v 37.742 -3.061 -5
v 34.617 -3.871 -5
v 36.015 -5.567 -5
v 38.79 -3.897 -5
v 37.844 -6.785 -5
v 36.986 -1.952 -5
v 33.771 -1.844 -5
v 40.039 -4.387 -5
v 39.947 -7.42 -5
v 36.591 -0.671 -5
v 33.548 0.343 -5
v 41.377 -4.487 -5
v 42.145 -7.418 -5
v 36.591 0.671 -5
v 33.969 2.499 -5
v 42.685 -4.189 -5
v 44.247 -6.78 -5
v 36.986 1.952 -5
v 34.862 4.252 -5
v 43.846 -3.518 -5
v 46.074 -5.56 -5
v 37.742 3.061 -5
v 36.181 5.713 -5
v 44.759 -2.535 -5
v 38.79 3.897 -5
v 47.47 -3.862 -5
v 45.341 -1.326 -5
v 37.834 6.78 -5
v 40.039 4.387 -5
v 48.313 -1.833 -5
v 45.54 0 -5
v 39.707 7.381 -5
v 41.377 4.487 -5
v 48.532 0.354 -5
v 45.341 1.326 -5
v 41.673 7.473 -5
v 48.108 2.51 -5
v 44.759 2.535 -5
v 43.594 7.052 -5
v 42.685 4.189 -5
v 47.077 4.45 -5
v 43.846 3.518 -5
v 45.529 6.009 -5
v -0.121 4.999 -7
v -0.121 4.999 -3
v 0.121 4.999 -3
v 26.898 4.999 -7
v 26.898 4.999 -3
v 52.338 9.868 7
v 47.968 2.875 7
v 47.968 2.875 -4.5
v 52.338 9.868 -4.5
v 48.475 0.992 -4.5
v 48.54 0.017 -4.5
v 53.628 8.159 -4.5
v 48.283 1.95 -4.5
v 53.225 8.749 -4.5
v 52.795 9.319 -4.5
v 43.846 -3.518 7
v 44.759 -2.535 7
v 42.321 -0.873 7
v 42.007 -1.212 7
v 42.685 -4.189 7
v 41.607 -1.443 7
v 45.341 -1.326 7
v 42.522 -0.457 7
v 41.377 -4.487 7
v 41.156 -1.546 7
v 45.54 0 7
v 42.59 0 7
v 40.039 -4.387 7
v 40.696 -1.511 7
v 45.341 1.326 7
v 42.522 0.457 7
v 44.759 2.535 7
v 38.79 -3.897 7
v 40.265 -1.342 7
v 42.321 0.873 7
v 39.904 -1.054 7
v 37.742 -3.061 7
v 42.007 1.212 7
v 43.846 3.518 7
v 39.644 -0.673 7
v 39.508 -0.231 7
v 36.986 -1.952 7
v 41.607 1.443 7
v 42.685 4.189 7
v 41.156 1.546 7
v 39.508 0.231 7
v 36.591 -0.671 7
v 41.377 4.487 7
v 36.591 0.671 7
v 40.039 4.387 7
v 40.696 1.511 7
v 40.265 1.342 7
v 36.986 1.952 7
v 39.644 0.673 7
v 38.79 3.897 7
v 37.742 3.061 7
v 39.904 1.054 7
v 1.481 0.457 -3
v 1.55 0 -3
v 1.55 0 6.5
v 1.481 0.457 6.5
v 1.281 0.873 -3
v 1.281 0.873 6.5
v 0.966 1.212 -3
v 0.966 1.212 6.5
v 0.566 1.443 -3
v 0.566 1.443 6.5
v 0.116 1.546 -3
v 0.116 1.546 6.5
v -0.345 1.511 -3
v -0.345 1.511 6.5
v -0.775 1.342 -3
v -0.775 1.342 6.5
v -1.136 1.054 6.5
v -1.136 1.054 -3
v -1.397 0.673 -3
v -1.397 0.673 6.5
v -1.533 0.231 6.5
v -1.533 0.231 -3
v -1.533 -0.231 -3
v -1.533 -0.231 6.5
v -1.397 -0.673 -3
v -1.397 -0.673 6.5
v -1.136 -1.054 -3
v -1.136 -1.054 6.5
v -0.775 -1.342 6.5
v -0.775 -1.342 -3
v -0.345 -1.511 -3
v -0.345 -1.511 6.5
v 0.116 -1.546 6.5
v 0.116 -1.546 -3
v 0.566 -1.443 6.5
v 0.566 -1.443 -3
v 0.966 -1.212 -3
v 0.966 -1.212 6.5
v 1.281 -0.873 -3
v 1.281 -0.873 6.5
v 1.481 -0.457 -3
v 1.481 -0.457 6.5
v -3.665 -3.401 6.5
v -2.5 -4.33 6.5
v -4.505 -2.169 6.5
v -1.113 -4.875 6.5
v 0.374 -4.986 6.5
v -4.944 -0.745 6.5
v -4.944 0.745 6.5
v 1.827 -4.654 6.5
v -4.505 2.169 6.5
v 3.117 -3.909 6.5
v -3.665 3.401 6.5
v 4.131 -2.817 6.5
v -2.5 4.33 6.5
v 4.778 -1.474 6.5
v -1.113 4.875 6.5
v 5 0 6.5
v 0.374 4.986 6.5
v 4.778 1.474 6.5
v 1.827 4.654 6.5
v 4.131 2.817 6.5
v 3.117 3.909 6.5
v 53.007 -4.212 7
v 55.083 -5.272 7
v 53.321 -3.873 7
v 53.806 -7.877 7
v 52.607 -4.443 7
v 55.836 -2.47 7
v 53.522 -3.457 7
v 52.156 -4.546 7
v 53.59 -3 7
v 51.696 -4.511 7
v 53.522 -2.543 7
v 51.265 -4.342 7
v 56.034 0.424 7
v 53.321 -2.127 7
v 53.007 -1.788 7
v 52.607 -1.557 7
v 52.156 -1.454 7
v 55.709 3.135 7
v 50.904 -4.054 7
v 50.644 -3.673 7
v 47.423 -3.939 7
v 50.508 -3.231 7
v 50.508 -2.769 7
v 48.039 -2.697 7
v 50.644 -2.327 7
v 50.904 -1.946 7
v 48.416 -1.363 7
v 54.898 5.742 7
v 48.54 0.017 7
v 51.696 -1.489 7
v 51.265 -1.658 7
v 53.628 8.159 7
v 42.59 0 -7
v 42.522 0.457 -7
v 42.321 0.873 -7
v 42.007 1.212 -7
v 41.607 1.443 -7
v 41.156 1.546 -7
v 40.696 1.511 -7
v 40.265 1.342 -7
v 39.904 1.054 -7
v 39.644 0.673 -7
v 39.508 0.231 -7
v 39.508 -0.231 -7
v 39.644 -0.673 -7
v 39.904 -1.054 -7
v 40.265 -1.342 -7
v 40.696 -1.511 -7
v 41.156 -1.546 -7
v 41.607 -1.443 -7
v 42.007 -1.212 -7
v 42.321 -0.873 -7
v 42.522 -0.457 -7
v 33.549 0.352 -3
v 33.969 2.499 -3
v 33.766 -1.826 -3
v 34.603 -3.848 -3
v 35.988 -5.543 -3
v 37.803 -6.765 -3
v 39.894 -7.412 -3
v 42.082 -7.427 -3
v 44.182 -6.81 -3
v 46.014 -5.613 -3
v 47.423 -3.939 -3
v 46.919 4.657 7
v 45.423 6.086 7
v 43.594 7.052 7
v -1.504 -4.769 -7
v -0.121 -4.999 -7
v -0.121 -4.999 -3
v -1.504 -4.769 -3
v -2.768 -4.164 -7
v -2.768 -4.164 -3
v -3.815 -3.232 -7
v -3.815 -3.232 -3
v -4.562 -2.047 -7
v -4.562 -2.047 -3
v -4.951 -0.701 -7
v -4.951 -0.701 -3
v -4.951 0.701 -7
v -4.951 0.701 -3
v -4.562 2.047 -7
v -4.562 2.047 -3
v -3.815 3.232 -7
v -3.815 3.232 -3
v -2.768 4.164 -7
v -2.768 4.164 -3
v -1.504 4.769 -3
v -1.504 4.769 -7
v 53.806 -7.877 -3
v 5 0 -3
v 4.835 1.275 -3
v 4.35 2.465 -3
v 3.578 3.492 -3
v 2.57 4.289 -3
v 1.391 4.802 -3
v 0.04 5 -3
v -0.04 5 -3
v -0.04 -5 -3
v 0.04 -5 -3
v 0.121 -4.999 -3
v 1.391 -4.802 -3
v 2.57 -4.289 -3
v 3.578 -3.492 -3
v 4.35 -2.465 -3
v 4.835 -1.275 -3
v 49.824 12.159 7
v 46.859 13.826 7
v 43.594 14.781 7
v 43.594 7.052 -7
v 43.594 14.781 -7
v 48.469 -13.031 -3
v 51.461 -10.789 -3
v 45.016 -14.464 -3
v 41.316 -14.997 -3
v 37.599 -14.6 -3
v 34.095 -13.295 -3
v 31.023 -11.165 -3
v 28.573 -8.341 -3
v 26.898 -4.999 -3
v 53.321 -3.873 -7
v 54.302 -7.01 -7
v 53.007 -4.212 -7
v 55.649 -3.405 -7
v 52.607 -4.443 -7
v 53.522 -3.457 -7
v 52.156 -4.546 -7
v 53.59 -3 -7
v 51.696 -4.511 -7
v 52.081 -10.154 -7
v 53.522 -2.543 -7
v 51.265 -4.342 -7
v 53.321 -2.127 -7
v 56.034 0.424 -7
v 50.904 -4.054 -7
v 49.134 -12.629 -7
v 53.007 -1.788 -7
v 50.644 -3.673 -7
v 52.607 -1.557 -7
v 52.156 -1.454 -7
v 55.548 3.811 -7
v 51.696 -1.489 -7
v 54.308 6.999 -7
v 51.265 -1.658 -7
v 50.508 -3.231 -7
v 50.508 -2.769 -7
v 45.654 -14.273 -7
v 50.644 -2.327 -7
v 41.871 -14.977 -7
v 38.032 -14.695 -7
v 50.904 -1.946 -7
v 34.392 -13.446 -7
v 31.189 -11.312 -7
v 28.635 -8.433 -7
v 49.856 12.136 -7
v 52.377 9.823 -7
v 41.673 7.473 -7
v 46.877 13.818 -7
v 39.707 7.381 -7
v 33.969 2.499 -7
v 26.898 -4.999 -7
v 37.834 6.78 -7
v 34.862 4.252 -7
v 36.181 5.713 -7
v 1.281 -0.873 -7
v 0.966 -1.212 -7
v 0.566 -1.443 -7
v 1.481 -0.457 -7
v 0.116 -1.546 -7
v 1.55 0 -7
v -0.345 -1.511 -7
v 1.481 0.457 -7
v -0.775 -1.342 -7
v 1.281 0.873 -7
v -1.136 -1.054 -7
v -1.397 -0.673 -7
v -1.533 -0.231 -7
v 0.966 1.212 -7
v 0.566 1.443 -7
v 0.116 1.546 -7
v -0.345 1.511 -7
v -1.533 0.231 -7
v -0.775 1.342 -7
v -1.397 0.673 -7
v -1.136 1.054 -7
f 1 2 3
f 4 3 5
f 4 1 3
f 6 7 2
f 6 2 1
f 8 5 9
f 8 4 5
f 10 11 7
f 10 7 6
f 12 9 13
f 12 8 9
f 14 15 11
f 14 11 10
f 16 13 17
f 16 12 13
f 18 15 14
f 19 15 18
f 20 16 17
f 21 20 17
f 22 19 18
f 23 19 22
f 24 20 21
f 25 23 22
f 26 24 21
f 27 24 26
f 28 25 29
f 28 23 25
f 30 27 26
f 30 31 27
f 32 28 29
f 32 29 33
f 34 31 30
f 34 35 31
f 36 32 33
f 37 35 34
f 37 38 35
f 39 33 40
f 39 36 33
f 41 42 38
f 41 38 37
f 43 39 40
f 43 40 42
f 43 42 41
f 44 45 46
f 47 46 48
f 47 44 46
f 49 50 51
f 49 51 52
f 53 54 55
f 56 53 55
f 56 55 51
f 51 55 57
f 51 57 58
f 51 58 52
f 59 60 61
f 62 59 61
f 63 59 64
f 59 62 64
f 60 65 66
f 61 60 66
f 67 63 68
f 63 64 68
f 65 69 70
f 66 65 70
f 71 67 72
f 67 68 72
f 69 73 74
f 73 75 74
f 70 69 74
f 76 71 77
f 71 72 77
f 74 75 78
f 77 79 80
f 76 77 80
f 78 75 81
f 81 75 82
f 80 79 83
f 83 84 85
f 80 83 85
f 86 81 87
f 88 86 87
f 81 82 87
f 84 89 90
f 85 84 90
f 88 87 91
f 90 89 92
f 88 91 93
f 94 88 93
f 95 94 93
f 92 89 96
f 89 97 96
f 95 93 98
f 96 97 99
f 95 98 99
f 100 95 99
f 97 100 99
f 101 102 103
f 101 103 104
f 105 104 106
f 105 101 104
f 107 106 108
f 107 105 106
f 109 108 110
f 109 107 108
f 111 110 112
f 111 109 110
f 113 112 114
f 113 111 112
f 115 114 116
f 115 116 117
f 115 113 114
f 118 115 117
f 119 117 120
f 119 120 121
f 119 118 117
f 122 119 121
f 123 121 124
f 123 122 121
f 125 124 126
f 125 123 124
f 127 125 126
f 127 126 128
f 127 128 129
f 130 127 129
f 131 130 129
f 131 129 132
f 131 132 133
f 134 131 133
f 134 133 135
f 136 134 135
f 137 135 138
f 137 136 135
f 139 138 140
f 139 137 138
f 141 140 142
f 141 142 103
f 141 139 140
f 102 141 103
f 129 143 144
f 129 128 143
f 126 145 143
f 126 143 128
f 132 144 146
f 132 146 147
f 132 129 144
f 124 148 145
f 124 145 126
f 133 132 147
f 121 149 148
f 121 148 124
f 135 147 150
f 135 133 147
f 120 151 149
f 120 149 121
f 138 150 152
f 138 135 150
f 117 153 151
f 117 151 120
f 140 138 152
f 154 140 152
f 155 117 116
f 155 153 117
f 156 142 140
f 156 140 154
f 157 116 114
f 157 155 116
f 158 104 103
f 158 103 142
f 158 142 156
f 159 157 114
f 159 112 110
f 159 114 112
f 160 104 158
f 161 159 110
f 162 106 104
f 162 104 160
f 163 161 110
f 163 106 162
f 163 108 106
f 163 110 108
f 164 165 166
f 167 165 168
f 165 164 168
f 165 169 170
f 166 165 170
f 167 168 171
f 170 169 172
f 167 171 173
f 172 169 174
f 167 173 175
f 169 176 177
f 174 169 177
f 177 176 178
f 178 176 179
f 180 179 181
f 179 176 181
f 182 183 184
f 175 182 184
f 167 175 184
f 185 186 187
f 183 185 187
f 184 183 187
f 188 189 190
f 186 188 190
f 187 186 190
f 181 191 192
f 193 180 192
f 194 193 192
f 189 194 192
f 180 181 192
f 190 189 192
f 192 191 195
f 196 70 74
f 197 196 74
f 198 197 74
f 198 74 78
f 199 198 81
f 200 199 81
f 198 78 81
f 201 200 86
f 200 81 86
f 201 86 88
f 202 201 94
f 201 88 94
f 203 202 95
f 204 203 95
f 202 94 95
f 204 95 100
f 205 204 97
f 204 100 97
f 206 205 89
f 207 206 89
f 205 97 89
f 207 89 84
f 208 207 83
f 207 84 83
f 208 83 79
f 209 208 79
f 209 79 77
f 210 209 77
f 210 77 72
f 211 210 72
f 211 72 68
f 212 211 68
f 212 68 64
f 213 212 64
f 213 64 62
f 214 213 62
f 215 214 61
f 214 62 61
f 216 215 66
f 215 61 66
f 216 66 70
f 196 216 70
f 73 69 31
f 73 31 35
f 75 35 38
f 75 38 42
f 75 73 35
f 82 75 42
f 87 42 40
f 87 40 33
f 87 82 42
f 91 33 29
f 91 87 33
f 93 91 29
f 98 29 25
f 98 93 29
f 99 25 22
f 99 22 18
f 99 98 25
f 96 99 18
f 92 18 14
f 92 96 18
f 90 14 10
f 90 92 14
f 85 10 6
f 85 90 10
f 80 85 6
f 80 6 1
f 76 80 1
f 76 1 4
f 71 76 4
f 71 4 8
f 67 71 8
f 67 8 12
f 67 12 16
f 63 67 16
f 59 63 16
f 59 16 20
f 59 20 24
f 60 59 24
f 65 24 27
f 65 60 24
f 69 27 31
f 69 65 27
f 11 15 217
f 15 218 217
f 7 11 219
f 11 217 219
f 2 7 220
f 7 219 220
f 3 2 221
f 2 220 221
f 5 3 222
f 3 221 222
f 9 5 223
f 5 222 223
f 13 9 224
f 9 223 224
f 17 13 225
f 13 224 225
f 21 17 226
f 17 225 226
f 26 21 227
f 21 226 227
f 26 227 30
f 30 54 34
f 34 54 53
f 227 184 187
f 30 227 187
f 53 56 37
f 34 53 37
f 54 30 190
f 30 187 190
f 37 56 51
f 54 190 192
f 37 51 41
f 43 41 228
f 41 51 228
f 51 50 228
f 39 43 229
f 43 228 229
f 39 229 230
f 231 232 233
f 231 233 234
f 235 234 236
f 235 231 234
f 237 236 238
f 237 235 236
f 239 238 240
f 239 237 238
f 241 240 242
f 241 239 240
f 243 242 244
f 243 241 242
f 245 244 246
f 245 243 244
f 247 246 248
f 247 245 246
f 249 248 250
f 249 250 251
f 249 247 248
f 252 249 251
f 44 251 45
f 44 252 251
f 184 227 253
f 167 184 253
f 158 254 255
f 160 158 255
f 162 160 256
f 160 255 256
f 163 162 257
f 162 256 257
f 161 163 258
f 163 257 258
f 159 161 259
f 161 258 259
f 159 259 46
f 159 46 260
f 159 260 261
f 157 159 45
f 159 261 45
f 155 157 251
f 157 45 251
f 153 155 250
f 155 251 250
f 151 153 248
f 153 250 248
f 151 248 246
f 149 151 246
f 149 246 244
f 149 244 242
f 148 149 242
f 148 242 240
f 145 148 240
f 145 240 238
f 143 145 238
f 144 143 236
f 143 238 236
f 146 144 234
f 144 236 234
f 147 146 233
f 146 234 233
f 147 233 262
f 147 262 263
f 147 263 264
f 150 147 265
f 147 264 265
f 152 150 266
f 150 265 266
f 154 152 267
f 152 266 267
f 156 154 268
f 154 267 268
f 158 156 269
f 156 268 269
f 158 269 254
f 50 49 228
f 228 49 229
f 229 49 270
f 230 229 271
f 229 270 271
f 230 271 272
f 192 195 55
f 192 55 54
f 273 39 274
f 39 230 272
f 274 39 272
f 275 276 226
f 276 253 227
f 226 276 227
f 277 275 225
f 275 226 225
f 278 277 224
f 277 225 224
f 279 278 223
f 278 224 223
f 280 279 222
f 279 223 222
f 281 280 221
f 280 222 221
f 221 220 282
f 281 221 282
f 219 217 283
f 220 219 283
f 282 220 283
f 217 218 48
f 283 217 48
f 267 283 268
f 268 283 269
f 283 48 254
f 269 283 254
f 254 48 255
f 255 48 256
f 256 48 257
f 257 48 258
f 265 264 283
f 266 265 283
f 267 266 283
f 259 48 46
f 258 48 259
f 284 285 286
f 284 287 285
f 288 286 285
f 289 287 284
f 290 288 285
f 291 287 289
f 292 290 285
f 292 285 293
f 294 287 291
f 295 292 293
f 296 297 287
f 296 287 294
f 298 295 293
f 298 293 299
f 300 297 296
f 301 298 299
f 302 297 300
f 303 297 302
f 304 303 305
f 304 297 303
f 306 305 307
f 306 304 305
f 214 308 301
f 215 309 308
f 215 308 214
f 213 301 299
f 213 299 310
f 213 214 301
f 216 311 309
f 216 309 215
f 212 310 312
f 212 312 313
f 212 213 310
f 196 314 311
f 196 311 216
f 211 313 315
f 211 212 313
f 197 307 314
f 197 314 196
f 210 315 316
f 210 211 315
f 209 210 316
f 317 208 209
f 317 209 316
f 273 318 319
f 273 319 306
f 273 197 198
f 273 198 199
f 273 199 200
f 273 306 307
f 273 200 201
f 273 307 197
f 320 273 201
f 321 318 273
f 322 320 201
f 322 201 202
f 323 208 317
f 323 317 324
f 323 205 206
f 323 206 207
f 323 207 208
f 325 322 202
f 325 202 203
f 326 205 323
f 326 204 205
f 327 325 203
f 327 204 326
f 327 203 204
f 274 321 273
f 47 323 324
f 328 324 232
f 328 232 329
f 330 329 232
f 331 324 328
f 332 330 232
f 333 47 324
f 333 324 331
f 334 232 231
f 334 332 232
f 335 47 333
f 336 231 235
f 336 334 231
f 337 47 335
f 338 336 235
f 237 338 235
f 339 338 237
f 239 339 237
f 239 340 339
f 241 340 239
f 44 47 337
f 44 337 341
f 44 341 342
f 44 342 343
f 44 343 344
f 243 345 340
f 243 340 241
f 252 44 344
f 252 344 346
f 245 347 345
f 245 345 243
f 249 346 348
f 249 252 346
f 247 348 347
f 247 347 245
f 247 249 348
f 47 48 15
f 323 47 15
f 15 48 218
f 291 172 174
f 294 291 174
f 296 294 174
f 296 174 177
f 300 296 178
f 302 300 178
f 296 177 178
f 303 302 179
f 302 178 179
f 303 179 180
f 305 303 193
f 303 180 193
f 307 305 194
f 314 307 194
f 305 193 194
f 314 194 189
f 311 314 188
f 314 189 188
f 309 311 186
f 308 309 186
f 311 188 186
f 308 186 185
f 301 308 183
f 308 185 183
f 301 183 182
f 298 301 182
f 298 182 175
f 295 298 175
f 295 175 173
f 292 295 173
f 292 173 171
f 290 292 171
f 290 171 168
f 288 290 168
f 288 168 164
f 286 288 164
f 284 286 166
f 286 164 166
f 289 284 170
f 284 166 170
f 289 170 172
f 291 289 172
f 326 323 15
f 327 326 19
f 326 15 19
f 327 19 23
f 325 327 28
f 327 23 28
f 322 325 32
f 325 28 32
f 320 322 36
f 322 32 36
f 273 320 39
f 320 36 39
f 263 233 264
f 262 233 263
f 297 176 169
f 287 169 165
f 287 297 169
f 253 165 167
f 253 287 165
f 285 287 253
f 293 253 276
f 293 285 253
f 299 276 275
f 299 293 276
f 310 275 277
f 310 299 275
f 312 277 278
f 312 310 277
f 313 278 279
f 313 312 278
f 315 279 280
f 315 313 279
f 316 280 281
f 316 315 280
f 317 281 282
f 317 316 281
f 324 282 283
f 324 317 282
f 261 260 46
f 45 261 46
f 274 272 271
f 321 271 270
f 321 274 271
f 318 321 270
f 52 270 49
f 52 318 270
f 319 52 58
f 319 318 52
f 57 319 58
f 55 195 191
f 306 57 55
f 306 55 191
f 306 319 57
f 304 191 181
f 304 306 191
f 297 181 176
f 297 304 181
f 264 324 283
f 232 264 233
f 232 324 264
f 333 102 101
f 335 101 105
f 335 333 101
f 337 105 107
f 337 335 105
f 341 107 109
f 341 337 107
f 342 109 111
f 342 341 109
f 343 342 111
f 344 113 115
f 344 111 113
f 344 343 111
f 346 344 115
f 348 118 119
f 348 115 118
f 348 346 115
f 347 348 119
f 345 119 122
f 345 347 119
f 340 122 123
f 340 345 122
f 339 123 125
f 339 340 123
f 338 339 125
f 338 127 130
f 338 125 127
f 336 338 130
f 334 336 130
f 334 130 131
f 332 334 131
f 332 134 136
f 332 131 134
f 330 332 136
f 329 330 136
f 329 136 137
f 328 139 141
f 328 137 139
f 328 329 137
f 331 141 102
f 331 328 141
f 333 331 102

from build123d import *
from build123d.topology import SkipClean

# Parameters (mm, degrees)
BOSS_EXTRU_1_DEPTH      = 7
BOSS_EXTRU_1_DEPTH_BACK = 7
ESQUISSE1_R             = 1.55
ESQUISSE3_R             = 7.5
ESQUISSE3_R_2           = 4.5
ENL_V_MAT_EXTRU_1_DEPTH = 12
ENL_V_MAT_EXTRU_2_REACH = 61.679
ESQUISSE5_R             = 1.55
ENL_V_MAT_EXTRU_3_DEPTH = 14
ENL_V_MAT_EXTRU_4_DEPTH = 11.5
ENL_V_MAT_EXTRU_5_DEPTH = 10
ESQUISSE8_R             = 5
ESQUISSE8_R_2           = 1.55
BOSS_EXTRU_3_DEPTH      = 9.5
SKETCH1_R               = 1.55
CUT_EXTRUDE1_DEPTH      = 14


with BuildPart() as part:
    # Esquisse1 → Boss.-Extru.1 (new, two sides: drawn at the far end of the back side and taken through both)
    with BuildSketch(Plane.XY.offset(-BOSS_EXTRU_1_DEPTH_BACK)):
        with BuildLine():
            Line((-0.121307676, 4.998528228), (26.897812493, 4.998528228))
            ThreePointArc((26.897812493, 4.998528228), (43.36686221, 14.818498296), (56.034466428, 0.42429064))
            ThreePointArc((56.034466428, 0.42429064), (43.785088024, -14.746764493), (26.897812493, -4.998528228))
            Line((26.897812493, -4.998528228), (-0.121307676, -4.998528228))
            ThreePointArc((-0.121307676, -4.998528228), (-5, 0), (-0.121307676, 4.998528228))
        make_face()
        Circle(ESQUISSE1_R, mode=Mode.SUBTRACT)
    extrude(amount=BOSS_EXTRU_1_DEPTH + BOSS_EXTRU_1_DEPTH_BACK)

    # Esquisse3 → Enlèv. mat.-Extru.1 (cut)
    with BuildSketch(Plane.XY.offset(7)):
        with Locations((41.040468381, 0)):
            Circle(ESQUISSE3_R)
        with Locations((41.040468381, 0)):
            Circle(ESQUISSE3_R_2, mode=Mode.SUBTRACT)
    extrude(amount=-ENL_V_MAT_EXTRU_1_DEPTH, mode=Mode.SUBTRACT)

    # Enlèv. mat.-Extru.2: up to this face of the body (flat: up to its plane)
    enl_v_mat_extru_2_end = Plane(part.part.faces().sort_by_distance((32.334245268, 0, -7))[0])
    # Esquisse4 → Enlèv. mat.-Extru.2 (cut, up to the picked face)
    with BuildSketch(Plane.XY.offset(7), mode=Mode.PRIVATE) as enl_v_mat_extru_2_sk1:
        with BuildLine():
            Line((26.897812493, 4.998528228), (33.969140437, 2.499264114))
            ThreePointArc((33.969140437, 2.499264114), (37.833778623, 6.779907138), (43.594458809, 7.051746797))
            Line((43.594458809, 7.051746797), (43.594458809, 14.780971987))
            ThreePointArc((43.594458809, 14.780971987), (33.45770218, 12.942243111), (26.897812493, 4.998528228))
        make_face()
    enl_v_mat_extru_2_tool1 = split(extrude(enl_v_mat_extru_2_sk1.sketch, amount=-ENL_V_MAT_EXTRU_2_REACH, mode=Mode.PRIVATE), bisect_by=enl_v_mat_extru_2_end, keep=Keep.BOTH, mode=Mode.PRIVATE)
    add(enl_v_mat_extru_2_tool1.solids().sort_by(Axis((35.915209, 9.281231, 7), (0, 0, -1)))[0], mode=Mode.SUBTRACT)

    # Esquisse5 → Enlèv. mat.-Extru.3 (cut)
    with BuildSketch(Plane.XY.offset(7)):
        with Locations((41.040468381, 0)):
            Circle(ESQUISSE5_R)
    extrude(amount=-ENL_V_MAT_EXTRU_3_DEPTH, mode=Mode.SUBTRACT)

    # Esquisse6 → Enlèv. mat.-Extru.4 (cut)
    with BuildSketch(Plane(origin=(0, 0, 7), x_dir=(-1, 0, 0), z_dir=(0, 0, -1))):
        with BuildLine():
            Line((-47.967646393, 2.874752996), (-52.337500651, 9.867981652))
            ThreePointArc((-52.337500651, 9.867981652), (-53.013141031, 9.036321686), (-53.627686287, 8.158550445))
            Line((-53.627686287, 8.158550445), (-48.540448501, 0.017268159))
            ThreePointArc((-48.540448501, 0.017268159), (-48.394176822, 1.474100456), (-47.967646393, 2.874752996))
        make_face()
    extrude(amount=ENL_V_MAT_EXTRU_4_DEPTH, mode=Mode.SUBTRACT)

    # Esquisse7 → Enlèv. mat.-Extru.5 (cut)
    with BuildSketch(Plane.XY.offset(7)):
        with BuildLine():
            Line((47.423042191, -3.938623052), (53.805616002, -7.877246105))
            ThreePointArc((53.805616002, -7.877246105), (39.444806634, -14.914887314), (26.897812493, -4.998528228))
            Line((26.897812493, -4.998528228), (-0.121307676, -4.998528228))
            ThreePointArc((-0.121307676, -4.998528228), (-5.242615351, 0), (-0.121307676, 4.998528228))
            Line((-0.121307676, 4.998528228), (26.897812493, 4.998528228))
            Line((26.897812493, 4.998528228), (33.969140437, 2.499264114))
            ThreePointArc((33.969140437, 2.499264114), (37.803155706, -6.76533862), (47.423042191, -3.938623052))
        make_face()
    extrude(amount=-ENL_V_MAT_EXTRU_5_DEPTH, mode=Mode.SUBTRACT)

    # Esquisse8 → Boss.-Extru.3 (add)
    with SkipClean():  # the faces are left unmerged after this step: merging them gives an invalid solid
        with BuildSketch(Plane.XY.offset(-3)):
            Circle(ESQUISSE8_R)
            Circle(ESQUISSE8_R_2, mode=Mode.SUBTRACT)
        extrude(amount=BOSS_EXTRU_3_DEPTH)

    # Sketch1 → Cut-Extrude1 (cut)
    with SkipClean():  # the faces are left unmerged after this step: merging them gives an invalid solid
        with BuildSketch(Plane.XY.offset(7)):
            with Locations((52.040468381, -3)):
                Circle(SKETCH1_R)
        extrude(amount=-CUT_EXTRUDE1_DEPTH, mode=Mode.SUBTRACT)


solid = part.part
